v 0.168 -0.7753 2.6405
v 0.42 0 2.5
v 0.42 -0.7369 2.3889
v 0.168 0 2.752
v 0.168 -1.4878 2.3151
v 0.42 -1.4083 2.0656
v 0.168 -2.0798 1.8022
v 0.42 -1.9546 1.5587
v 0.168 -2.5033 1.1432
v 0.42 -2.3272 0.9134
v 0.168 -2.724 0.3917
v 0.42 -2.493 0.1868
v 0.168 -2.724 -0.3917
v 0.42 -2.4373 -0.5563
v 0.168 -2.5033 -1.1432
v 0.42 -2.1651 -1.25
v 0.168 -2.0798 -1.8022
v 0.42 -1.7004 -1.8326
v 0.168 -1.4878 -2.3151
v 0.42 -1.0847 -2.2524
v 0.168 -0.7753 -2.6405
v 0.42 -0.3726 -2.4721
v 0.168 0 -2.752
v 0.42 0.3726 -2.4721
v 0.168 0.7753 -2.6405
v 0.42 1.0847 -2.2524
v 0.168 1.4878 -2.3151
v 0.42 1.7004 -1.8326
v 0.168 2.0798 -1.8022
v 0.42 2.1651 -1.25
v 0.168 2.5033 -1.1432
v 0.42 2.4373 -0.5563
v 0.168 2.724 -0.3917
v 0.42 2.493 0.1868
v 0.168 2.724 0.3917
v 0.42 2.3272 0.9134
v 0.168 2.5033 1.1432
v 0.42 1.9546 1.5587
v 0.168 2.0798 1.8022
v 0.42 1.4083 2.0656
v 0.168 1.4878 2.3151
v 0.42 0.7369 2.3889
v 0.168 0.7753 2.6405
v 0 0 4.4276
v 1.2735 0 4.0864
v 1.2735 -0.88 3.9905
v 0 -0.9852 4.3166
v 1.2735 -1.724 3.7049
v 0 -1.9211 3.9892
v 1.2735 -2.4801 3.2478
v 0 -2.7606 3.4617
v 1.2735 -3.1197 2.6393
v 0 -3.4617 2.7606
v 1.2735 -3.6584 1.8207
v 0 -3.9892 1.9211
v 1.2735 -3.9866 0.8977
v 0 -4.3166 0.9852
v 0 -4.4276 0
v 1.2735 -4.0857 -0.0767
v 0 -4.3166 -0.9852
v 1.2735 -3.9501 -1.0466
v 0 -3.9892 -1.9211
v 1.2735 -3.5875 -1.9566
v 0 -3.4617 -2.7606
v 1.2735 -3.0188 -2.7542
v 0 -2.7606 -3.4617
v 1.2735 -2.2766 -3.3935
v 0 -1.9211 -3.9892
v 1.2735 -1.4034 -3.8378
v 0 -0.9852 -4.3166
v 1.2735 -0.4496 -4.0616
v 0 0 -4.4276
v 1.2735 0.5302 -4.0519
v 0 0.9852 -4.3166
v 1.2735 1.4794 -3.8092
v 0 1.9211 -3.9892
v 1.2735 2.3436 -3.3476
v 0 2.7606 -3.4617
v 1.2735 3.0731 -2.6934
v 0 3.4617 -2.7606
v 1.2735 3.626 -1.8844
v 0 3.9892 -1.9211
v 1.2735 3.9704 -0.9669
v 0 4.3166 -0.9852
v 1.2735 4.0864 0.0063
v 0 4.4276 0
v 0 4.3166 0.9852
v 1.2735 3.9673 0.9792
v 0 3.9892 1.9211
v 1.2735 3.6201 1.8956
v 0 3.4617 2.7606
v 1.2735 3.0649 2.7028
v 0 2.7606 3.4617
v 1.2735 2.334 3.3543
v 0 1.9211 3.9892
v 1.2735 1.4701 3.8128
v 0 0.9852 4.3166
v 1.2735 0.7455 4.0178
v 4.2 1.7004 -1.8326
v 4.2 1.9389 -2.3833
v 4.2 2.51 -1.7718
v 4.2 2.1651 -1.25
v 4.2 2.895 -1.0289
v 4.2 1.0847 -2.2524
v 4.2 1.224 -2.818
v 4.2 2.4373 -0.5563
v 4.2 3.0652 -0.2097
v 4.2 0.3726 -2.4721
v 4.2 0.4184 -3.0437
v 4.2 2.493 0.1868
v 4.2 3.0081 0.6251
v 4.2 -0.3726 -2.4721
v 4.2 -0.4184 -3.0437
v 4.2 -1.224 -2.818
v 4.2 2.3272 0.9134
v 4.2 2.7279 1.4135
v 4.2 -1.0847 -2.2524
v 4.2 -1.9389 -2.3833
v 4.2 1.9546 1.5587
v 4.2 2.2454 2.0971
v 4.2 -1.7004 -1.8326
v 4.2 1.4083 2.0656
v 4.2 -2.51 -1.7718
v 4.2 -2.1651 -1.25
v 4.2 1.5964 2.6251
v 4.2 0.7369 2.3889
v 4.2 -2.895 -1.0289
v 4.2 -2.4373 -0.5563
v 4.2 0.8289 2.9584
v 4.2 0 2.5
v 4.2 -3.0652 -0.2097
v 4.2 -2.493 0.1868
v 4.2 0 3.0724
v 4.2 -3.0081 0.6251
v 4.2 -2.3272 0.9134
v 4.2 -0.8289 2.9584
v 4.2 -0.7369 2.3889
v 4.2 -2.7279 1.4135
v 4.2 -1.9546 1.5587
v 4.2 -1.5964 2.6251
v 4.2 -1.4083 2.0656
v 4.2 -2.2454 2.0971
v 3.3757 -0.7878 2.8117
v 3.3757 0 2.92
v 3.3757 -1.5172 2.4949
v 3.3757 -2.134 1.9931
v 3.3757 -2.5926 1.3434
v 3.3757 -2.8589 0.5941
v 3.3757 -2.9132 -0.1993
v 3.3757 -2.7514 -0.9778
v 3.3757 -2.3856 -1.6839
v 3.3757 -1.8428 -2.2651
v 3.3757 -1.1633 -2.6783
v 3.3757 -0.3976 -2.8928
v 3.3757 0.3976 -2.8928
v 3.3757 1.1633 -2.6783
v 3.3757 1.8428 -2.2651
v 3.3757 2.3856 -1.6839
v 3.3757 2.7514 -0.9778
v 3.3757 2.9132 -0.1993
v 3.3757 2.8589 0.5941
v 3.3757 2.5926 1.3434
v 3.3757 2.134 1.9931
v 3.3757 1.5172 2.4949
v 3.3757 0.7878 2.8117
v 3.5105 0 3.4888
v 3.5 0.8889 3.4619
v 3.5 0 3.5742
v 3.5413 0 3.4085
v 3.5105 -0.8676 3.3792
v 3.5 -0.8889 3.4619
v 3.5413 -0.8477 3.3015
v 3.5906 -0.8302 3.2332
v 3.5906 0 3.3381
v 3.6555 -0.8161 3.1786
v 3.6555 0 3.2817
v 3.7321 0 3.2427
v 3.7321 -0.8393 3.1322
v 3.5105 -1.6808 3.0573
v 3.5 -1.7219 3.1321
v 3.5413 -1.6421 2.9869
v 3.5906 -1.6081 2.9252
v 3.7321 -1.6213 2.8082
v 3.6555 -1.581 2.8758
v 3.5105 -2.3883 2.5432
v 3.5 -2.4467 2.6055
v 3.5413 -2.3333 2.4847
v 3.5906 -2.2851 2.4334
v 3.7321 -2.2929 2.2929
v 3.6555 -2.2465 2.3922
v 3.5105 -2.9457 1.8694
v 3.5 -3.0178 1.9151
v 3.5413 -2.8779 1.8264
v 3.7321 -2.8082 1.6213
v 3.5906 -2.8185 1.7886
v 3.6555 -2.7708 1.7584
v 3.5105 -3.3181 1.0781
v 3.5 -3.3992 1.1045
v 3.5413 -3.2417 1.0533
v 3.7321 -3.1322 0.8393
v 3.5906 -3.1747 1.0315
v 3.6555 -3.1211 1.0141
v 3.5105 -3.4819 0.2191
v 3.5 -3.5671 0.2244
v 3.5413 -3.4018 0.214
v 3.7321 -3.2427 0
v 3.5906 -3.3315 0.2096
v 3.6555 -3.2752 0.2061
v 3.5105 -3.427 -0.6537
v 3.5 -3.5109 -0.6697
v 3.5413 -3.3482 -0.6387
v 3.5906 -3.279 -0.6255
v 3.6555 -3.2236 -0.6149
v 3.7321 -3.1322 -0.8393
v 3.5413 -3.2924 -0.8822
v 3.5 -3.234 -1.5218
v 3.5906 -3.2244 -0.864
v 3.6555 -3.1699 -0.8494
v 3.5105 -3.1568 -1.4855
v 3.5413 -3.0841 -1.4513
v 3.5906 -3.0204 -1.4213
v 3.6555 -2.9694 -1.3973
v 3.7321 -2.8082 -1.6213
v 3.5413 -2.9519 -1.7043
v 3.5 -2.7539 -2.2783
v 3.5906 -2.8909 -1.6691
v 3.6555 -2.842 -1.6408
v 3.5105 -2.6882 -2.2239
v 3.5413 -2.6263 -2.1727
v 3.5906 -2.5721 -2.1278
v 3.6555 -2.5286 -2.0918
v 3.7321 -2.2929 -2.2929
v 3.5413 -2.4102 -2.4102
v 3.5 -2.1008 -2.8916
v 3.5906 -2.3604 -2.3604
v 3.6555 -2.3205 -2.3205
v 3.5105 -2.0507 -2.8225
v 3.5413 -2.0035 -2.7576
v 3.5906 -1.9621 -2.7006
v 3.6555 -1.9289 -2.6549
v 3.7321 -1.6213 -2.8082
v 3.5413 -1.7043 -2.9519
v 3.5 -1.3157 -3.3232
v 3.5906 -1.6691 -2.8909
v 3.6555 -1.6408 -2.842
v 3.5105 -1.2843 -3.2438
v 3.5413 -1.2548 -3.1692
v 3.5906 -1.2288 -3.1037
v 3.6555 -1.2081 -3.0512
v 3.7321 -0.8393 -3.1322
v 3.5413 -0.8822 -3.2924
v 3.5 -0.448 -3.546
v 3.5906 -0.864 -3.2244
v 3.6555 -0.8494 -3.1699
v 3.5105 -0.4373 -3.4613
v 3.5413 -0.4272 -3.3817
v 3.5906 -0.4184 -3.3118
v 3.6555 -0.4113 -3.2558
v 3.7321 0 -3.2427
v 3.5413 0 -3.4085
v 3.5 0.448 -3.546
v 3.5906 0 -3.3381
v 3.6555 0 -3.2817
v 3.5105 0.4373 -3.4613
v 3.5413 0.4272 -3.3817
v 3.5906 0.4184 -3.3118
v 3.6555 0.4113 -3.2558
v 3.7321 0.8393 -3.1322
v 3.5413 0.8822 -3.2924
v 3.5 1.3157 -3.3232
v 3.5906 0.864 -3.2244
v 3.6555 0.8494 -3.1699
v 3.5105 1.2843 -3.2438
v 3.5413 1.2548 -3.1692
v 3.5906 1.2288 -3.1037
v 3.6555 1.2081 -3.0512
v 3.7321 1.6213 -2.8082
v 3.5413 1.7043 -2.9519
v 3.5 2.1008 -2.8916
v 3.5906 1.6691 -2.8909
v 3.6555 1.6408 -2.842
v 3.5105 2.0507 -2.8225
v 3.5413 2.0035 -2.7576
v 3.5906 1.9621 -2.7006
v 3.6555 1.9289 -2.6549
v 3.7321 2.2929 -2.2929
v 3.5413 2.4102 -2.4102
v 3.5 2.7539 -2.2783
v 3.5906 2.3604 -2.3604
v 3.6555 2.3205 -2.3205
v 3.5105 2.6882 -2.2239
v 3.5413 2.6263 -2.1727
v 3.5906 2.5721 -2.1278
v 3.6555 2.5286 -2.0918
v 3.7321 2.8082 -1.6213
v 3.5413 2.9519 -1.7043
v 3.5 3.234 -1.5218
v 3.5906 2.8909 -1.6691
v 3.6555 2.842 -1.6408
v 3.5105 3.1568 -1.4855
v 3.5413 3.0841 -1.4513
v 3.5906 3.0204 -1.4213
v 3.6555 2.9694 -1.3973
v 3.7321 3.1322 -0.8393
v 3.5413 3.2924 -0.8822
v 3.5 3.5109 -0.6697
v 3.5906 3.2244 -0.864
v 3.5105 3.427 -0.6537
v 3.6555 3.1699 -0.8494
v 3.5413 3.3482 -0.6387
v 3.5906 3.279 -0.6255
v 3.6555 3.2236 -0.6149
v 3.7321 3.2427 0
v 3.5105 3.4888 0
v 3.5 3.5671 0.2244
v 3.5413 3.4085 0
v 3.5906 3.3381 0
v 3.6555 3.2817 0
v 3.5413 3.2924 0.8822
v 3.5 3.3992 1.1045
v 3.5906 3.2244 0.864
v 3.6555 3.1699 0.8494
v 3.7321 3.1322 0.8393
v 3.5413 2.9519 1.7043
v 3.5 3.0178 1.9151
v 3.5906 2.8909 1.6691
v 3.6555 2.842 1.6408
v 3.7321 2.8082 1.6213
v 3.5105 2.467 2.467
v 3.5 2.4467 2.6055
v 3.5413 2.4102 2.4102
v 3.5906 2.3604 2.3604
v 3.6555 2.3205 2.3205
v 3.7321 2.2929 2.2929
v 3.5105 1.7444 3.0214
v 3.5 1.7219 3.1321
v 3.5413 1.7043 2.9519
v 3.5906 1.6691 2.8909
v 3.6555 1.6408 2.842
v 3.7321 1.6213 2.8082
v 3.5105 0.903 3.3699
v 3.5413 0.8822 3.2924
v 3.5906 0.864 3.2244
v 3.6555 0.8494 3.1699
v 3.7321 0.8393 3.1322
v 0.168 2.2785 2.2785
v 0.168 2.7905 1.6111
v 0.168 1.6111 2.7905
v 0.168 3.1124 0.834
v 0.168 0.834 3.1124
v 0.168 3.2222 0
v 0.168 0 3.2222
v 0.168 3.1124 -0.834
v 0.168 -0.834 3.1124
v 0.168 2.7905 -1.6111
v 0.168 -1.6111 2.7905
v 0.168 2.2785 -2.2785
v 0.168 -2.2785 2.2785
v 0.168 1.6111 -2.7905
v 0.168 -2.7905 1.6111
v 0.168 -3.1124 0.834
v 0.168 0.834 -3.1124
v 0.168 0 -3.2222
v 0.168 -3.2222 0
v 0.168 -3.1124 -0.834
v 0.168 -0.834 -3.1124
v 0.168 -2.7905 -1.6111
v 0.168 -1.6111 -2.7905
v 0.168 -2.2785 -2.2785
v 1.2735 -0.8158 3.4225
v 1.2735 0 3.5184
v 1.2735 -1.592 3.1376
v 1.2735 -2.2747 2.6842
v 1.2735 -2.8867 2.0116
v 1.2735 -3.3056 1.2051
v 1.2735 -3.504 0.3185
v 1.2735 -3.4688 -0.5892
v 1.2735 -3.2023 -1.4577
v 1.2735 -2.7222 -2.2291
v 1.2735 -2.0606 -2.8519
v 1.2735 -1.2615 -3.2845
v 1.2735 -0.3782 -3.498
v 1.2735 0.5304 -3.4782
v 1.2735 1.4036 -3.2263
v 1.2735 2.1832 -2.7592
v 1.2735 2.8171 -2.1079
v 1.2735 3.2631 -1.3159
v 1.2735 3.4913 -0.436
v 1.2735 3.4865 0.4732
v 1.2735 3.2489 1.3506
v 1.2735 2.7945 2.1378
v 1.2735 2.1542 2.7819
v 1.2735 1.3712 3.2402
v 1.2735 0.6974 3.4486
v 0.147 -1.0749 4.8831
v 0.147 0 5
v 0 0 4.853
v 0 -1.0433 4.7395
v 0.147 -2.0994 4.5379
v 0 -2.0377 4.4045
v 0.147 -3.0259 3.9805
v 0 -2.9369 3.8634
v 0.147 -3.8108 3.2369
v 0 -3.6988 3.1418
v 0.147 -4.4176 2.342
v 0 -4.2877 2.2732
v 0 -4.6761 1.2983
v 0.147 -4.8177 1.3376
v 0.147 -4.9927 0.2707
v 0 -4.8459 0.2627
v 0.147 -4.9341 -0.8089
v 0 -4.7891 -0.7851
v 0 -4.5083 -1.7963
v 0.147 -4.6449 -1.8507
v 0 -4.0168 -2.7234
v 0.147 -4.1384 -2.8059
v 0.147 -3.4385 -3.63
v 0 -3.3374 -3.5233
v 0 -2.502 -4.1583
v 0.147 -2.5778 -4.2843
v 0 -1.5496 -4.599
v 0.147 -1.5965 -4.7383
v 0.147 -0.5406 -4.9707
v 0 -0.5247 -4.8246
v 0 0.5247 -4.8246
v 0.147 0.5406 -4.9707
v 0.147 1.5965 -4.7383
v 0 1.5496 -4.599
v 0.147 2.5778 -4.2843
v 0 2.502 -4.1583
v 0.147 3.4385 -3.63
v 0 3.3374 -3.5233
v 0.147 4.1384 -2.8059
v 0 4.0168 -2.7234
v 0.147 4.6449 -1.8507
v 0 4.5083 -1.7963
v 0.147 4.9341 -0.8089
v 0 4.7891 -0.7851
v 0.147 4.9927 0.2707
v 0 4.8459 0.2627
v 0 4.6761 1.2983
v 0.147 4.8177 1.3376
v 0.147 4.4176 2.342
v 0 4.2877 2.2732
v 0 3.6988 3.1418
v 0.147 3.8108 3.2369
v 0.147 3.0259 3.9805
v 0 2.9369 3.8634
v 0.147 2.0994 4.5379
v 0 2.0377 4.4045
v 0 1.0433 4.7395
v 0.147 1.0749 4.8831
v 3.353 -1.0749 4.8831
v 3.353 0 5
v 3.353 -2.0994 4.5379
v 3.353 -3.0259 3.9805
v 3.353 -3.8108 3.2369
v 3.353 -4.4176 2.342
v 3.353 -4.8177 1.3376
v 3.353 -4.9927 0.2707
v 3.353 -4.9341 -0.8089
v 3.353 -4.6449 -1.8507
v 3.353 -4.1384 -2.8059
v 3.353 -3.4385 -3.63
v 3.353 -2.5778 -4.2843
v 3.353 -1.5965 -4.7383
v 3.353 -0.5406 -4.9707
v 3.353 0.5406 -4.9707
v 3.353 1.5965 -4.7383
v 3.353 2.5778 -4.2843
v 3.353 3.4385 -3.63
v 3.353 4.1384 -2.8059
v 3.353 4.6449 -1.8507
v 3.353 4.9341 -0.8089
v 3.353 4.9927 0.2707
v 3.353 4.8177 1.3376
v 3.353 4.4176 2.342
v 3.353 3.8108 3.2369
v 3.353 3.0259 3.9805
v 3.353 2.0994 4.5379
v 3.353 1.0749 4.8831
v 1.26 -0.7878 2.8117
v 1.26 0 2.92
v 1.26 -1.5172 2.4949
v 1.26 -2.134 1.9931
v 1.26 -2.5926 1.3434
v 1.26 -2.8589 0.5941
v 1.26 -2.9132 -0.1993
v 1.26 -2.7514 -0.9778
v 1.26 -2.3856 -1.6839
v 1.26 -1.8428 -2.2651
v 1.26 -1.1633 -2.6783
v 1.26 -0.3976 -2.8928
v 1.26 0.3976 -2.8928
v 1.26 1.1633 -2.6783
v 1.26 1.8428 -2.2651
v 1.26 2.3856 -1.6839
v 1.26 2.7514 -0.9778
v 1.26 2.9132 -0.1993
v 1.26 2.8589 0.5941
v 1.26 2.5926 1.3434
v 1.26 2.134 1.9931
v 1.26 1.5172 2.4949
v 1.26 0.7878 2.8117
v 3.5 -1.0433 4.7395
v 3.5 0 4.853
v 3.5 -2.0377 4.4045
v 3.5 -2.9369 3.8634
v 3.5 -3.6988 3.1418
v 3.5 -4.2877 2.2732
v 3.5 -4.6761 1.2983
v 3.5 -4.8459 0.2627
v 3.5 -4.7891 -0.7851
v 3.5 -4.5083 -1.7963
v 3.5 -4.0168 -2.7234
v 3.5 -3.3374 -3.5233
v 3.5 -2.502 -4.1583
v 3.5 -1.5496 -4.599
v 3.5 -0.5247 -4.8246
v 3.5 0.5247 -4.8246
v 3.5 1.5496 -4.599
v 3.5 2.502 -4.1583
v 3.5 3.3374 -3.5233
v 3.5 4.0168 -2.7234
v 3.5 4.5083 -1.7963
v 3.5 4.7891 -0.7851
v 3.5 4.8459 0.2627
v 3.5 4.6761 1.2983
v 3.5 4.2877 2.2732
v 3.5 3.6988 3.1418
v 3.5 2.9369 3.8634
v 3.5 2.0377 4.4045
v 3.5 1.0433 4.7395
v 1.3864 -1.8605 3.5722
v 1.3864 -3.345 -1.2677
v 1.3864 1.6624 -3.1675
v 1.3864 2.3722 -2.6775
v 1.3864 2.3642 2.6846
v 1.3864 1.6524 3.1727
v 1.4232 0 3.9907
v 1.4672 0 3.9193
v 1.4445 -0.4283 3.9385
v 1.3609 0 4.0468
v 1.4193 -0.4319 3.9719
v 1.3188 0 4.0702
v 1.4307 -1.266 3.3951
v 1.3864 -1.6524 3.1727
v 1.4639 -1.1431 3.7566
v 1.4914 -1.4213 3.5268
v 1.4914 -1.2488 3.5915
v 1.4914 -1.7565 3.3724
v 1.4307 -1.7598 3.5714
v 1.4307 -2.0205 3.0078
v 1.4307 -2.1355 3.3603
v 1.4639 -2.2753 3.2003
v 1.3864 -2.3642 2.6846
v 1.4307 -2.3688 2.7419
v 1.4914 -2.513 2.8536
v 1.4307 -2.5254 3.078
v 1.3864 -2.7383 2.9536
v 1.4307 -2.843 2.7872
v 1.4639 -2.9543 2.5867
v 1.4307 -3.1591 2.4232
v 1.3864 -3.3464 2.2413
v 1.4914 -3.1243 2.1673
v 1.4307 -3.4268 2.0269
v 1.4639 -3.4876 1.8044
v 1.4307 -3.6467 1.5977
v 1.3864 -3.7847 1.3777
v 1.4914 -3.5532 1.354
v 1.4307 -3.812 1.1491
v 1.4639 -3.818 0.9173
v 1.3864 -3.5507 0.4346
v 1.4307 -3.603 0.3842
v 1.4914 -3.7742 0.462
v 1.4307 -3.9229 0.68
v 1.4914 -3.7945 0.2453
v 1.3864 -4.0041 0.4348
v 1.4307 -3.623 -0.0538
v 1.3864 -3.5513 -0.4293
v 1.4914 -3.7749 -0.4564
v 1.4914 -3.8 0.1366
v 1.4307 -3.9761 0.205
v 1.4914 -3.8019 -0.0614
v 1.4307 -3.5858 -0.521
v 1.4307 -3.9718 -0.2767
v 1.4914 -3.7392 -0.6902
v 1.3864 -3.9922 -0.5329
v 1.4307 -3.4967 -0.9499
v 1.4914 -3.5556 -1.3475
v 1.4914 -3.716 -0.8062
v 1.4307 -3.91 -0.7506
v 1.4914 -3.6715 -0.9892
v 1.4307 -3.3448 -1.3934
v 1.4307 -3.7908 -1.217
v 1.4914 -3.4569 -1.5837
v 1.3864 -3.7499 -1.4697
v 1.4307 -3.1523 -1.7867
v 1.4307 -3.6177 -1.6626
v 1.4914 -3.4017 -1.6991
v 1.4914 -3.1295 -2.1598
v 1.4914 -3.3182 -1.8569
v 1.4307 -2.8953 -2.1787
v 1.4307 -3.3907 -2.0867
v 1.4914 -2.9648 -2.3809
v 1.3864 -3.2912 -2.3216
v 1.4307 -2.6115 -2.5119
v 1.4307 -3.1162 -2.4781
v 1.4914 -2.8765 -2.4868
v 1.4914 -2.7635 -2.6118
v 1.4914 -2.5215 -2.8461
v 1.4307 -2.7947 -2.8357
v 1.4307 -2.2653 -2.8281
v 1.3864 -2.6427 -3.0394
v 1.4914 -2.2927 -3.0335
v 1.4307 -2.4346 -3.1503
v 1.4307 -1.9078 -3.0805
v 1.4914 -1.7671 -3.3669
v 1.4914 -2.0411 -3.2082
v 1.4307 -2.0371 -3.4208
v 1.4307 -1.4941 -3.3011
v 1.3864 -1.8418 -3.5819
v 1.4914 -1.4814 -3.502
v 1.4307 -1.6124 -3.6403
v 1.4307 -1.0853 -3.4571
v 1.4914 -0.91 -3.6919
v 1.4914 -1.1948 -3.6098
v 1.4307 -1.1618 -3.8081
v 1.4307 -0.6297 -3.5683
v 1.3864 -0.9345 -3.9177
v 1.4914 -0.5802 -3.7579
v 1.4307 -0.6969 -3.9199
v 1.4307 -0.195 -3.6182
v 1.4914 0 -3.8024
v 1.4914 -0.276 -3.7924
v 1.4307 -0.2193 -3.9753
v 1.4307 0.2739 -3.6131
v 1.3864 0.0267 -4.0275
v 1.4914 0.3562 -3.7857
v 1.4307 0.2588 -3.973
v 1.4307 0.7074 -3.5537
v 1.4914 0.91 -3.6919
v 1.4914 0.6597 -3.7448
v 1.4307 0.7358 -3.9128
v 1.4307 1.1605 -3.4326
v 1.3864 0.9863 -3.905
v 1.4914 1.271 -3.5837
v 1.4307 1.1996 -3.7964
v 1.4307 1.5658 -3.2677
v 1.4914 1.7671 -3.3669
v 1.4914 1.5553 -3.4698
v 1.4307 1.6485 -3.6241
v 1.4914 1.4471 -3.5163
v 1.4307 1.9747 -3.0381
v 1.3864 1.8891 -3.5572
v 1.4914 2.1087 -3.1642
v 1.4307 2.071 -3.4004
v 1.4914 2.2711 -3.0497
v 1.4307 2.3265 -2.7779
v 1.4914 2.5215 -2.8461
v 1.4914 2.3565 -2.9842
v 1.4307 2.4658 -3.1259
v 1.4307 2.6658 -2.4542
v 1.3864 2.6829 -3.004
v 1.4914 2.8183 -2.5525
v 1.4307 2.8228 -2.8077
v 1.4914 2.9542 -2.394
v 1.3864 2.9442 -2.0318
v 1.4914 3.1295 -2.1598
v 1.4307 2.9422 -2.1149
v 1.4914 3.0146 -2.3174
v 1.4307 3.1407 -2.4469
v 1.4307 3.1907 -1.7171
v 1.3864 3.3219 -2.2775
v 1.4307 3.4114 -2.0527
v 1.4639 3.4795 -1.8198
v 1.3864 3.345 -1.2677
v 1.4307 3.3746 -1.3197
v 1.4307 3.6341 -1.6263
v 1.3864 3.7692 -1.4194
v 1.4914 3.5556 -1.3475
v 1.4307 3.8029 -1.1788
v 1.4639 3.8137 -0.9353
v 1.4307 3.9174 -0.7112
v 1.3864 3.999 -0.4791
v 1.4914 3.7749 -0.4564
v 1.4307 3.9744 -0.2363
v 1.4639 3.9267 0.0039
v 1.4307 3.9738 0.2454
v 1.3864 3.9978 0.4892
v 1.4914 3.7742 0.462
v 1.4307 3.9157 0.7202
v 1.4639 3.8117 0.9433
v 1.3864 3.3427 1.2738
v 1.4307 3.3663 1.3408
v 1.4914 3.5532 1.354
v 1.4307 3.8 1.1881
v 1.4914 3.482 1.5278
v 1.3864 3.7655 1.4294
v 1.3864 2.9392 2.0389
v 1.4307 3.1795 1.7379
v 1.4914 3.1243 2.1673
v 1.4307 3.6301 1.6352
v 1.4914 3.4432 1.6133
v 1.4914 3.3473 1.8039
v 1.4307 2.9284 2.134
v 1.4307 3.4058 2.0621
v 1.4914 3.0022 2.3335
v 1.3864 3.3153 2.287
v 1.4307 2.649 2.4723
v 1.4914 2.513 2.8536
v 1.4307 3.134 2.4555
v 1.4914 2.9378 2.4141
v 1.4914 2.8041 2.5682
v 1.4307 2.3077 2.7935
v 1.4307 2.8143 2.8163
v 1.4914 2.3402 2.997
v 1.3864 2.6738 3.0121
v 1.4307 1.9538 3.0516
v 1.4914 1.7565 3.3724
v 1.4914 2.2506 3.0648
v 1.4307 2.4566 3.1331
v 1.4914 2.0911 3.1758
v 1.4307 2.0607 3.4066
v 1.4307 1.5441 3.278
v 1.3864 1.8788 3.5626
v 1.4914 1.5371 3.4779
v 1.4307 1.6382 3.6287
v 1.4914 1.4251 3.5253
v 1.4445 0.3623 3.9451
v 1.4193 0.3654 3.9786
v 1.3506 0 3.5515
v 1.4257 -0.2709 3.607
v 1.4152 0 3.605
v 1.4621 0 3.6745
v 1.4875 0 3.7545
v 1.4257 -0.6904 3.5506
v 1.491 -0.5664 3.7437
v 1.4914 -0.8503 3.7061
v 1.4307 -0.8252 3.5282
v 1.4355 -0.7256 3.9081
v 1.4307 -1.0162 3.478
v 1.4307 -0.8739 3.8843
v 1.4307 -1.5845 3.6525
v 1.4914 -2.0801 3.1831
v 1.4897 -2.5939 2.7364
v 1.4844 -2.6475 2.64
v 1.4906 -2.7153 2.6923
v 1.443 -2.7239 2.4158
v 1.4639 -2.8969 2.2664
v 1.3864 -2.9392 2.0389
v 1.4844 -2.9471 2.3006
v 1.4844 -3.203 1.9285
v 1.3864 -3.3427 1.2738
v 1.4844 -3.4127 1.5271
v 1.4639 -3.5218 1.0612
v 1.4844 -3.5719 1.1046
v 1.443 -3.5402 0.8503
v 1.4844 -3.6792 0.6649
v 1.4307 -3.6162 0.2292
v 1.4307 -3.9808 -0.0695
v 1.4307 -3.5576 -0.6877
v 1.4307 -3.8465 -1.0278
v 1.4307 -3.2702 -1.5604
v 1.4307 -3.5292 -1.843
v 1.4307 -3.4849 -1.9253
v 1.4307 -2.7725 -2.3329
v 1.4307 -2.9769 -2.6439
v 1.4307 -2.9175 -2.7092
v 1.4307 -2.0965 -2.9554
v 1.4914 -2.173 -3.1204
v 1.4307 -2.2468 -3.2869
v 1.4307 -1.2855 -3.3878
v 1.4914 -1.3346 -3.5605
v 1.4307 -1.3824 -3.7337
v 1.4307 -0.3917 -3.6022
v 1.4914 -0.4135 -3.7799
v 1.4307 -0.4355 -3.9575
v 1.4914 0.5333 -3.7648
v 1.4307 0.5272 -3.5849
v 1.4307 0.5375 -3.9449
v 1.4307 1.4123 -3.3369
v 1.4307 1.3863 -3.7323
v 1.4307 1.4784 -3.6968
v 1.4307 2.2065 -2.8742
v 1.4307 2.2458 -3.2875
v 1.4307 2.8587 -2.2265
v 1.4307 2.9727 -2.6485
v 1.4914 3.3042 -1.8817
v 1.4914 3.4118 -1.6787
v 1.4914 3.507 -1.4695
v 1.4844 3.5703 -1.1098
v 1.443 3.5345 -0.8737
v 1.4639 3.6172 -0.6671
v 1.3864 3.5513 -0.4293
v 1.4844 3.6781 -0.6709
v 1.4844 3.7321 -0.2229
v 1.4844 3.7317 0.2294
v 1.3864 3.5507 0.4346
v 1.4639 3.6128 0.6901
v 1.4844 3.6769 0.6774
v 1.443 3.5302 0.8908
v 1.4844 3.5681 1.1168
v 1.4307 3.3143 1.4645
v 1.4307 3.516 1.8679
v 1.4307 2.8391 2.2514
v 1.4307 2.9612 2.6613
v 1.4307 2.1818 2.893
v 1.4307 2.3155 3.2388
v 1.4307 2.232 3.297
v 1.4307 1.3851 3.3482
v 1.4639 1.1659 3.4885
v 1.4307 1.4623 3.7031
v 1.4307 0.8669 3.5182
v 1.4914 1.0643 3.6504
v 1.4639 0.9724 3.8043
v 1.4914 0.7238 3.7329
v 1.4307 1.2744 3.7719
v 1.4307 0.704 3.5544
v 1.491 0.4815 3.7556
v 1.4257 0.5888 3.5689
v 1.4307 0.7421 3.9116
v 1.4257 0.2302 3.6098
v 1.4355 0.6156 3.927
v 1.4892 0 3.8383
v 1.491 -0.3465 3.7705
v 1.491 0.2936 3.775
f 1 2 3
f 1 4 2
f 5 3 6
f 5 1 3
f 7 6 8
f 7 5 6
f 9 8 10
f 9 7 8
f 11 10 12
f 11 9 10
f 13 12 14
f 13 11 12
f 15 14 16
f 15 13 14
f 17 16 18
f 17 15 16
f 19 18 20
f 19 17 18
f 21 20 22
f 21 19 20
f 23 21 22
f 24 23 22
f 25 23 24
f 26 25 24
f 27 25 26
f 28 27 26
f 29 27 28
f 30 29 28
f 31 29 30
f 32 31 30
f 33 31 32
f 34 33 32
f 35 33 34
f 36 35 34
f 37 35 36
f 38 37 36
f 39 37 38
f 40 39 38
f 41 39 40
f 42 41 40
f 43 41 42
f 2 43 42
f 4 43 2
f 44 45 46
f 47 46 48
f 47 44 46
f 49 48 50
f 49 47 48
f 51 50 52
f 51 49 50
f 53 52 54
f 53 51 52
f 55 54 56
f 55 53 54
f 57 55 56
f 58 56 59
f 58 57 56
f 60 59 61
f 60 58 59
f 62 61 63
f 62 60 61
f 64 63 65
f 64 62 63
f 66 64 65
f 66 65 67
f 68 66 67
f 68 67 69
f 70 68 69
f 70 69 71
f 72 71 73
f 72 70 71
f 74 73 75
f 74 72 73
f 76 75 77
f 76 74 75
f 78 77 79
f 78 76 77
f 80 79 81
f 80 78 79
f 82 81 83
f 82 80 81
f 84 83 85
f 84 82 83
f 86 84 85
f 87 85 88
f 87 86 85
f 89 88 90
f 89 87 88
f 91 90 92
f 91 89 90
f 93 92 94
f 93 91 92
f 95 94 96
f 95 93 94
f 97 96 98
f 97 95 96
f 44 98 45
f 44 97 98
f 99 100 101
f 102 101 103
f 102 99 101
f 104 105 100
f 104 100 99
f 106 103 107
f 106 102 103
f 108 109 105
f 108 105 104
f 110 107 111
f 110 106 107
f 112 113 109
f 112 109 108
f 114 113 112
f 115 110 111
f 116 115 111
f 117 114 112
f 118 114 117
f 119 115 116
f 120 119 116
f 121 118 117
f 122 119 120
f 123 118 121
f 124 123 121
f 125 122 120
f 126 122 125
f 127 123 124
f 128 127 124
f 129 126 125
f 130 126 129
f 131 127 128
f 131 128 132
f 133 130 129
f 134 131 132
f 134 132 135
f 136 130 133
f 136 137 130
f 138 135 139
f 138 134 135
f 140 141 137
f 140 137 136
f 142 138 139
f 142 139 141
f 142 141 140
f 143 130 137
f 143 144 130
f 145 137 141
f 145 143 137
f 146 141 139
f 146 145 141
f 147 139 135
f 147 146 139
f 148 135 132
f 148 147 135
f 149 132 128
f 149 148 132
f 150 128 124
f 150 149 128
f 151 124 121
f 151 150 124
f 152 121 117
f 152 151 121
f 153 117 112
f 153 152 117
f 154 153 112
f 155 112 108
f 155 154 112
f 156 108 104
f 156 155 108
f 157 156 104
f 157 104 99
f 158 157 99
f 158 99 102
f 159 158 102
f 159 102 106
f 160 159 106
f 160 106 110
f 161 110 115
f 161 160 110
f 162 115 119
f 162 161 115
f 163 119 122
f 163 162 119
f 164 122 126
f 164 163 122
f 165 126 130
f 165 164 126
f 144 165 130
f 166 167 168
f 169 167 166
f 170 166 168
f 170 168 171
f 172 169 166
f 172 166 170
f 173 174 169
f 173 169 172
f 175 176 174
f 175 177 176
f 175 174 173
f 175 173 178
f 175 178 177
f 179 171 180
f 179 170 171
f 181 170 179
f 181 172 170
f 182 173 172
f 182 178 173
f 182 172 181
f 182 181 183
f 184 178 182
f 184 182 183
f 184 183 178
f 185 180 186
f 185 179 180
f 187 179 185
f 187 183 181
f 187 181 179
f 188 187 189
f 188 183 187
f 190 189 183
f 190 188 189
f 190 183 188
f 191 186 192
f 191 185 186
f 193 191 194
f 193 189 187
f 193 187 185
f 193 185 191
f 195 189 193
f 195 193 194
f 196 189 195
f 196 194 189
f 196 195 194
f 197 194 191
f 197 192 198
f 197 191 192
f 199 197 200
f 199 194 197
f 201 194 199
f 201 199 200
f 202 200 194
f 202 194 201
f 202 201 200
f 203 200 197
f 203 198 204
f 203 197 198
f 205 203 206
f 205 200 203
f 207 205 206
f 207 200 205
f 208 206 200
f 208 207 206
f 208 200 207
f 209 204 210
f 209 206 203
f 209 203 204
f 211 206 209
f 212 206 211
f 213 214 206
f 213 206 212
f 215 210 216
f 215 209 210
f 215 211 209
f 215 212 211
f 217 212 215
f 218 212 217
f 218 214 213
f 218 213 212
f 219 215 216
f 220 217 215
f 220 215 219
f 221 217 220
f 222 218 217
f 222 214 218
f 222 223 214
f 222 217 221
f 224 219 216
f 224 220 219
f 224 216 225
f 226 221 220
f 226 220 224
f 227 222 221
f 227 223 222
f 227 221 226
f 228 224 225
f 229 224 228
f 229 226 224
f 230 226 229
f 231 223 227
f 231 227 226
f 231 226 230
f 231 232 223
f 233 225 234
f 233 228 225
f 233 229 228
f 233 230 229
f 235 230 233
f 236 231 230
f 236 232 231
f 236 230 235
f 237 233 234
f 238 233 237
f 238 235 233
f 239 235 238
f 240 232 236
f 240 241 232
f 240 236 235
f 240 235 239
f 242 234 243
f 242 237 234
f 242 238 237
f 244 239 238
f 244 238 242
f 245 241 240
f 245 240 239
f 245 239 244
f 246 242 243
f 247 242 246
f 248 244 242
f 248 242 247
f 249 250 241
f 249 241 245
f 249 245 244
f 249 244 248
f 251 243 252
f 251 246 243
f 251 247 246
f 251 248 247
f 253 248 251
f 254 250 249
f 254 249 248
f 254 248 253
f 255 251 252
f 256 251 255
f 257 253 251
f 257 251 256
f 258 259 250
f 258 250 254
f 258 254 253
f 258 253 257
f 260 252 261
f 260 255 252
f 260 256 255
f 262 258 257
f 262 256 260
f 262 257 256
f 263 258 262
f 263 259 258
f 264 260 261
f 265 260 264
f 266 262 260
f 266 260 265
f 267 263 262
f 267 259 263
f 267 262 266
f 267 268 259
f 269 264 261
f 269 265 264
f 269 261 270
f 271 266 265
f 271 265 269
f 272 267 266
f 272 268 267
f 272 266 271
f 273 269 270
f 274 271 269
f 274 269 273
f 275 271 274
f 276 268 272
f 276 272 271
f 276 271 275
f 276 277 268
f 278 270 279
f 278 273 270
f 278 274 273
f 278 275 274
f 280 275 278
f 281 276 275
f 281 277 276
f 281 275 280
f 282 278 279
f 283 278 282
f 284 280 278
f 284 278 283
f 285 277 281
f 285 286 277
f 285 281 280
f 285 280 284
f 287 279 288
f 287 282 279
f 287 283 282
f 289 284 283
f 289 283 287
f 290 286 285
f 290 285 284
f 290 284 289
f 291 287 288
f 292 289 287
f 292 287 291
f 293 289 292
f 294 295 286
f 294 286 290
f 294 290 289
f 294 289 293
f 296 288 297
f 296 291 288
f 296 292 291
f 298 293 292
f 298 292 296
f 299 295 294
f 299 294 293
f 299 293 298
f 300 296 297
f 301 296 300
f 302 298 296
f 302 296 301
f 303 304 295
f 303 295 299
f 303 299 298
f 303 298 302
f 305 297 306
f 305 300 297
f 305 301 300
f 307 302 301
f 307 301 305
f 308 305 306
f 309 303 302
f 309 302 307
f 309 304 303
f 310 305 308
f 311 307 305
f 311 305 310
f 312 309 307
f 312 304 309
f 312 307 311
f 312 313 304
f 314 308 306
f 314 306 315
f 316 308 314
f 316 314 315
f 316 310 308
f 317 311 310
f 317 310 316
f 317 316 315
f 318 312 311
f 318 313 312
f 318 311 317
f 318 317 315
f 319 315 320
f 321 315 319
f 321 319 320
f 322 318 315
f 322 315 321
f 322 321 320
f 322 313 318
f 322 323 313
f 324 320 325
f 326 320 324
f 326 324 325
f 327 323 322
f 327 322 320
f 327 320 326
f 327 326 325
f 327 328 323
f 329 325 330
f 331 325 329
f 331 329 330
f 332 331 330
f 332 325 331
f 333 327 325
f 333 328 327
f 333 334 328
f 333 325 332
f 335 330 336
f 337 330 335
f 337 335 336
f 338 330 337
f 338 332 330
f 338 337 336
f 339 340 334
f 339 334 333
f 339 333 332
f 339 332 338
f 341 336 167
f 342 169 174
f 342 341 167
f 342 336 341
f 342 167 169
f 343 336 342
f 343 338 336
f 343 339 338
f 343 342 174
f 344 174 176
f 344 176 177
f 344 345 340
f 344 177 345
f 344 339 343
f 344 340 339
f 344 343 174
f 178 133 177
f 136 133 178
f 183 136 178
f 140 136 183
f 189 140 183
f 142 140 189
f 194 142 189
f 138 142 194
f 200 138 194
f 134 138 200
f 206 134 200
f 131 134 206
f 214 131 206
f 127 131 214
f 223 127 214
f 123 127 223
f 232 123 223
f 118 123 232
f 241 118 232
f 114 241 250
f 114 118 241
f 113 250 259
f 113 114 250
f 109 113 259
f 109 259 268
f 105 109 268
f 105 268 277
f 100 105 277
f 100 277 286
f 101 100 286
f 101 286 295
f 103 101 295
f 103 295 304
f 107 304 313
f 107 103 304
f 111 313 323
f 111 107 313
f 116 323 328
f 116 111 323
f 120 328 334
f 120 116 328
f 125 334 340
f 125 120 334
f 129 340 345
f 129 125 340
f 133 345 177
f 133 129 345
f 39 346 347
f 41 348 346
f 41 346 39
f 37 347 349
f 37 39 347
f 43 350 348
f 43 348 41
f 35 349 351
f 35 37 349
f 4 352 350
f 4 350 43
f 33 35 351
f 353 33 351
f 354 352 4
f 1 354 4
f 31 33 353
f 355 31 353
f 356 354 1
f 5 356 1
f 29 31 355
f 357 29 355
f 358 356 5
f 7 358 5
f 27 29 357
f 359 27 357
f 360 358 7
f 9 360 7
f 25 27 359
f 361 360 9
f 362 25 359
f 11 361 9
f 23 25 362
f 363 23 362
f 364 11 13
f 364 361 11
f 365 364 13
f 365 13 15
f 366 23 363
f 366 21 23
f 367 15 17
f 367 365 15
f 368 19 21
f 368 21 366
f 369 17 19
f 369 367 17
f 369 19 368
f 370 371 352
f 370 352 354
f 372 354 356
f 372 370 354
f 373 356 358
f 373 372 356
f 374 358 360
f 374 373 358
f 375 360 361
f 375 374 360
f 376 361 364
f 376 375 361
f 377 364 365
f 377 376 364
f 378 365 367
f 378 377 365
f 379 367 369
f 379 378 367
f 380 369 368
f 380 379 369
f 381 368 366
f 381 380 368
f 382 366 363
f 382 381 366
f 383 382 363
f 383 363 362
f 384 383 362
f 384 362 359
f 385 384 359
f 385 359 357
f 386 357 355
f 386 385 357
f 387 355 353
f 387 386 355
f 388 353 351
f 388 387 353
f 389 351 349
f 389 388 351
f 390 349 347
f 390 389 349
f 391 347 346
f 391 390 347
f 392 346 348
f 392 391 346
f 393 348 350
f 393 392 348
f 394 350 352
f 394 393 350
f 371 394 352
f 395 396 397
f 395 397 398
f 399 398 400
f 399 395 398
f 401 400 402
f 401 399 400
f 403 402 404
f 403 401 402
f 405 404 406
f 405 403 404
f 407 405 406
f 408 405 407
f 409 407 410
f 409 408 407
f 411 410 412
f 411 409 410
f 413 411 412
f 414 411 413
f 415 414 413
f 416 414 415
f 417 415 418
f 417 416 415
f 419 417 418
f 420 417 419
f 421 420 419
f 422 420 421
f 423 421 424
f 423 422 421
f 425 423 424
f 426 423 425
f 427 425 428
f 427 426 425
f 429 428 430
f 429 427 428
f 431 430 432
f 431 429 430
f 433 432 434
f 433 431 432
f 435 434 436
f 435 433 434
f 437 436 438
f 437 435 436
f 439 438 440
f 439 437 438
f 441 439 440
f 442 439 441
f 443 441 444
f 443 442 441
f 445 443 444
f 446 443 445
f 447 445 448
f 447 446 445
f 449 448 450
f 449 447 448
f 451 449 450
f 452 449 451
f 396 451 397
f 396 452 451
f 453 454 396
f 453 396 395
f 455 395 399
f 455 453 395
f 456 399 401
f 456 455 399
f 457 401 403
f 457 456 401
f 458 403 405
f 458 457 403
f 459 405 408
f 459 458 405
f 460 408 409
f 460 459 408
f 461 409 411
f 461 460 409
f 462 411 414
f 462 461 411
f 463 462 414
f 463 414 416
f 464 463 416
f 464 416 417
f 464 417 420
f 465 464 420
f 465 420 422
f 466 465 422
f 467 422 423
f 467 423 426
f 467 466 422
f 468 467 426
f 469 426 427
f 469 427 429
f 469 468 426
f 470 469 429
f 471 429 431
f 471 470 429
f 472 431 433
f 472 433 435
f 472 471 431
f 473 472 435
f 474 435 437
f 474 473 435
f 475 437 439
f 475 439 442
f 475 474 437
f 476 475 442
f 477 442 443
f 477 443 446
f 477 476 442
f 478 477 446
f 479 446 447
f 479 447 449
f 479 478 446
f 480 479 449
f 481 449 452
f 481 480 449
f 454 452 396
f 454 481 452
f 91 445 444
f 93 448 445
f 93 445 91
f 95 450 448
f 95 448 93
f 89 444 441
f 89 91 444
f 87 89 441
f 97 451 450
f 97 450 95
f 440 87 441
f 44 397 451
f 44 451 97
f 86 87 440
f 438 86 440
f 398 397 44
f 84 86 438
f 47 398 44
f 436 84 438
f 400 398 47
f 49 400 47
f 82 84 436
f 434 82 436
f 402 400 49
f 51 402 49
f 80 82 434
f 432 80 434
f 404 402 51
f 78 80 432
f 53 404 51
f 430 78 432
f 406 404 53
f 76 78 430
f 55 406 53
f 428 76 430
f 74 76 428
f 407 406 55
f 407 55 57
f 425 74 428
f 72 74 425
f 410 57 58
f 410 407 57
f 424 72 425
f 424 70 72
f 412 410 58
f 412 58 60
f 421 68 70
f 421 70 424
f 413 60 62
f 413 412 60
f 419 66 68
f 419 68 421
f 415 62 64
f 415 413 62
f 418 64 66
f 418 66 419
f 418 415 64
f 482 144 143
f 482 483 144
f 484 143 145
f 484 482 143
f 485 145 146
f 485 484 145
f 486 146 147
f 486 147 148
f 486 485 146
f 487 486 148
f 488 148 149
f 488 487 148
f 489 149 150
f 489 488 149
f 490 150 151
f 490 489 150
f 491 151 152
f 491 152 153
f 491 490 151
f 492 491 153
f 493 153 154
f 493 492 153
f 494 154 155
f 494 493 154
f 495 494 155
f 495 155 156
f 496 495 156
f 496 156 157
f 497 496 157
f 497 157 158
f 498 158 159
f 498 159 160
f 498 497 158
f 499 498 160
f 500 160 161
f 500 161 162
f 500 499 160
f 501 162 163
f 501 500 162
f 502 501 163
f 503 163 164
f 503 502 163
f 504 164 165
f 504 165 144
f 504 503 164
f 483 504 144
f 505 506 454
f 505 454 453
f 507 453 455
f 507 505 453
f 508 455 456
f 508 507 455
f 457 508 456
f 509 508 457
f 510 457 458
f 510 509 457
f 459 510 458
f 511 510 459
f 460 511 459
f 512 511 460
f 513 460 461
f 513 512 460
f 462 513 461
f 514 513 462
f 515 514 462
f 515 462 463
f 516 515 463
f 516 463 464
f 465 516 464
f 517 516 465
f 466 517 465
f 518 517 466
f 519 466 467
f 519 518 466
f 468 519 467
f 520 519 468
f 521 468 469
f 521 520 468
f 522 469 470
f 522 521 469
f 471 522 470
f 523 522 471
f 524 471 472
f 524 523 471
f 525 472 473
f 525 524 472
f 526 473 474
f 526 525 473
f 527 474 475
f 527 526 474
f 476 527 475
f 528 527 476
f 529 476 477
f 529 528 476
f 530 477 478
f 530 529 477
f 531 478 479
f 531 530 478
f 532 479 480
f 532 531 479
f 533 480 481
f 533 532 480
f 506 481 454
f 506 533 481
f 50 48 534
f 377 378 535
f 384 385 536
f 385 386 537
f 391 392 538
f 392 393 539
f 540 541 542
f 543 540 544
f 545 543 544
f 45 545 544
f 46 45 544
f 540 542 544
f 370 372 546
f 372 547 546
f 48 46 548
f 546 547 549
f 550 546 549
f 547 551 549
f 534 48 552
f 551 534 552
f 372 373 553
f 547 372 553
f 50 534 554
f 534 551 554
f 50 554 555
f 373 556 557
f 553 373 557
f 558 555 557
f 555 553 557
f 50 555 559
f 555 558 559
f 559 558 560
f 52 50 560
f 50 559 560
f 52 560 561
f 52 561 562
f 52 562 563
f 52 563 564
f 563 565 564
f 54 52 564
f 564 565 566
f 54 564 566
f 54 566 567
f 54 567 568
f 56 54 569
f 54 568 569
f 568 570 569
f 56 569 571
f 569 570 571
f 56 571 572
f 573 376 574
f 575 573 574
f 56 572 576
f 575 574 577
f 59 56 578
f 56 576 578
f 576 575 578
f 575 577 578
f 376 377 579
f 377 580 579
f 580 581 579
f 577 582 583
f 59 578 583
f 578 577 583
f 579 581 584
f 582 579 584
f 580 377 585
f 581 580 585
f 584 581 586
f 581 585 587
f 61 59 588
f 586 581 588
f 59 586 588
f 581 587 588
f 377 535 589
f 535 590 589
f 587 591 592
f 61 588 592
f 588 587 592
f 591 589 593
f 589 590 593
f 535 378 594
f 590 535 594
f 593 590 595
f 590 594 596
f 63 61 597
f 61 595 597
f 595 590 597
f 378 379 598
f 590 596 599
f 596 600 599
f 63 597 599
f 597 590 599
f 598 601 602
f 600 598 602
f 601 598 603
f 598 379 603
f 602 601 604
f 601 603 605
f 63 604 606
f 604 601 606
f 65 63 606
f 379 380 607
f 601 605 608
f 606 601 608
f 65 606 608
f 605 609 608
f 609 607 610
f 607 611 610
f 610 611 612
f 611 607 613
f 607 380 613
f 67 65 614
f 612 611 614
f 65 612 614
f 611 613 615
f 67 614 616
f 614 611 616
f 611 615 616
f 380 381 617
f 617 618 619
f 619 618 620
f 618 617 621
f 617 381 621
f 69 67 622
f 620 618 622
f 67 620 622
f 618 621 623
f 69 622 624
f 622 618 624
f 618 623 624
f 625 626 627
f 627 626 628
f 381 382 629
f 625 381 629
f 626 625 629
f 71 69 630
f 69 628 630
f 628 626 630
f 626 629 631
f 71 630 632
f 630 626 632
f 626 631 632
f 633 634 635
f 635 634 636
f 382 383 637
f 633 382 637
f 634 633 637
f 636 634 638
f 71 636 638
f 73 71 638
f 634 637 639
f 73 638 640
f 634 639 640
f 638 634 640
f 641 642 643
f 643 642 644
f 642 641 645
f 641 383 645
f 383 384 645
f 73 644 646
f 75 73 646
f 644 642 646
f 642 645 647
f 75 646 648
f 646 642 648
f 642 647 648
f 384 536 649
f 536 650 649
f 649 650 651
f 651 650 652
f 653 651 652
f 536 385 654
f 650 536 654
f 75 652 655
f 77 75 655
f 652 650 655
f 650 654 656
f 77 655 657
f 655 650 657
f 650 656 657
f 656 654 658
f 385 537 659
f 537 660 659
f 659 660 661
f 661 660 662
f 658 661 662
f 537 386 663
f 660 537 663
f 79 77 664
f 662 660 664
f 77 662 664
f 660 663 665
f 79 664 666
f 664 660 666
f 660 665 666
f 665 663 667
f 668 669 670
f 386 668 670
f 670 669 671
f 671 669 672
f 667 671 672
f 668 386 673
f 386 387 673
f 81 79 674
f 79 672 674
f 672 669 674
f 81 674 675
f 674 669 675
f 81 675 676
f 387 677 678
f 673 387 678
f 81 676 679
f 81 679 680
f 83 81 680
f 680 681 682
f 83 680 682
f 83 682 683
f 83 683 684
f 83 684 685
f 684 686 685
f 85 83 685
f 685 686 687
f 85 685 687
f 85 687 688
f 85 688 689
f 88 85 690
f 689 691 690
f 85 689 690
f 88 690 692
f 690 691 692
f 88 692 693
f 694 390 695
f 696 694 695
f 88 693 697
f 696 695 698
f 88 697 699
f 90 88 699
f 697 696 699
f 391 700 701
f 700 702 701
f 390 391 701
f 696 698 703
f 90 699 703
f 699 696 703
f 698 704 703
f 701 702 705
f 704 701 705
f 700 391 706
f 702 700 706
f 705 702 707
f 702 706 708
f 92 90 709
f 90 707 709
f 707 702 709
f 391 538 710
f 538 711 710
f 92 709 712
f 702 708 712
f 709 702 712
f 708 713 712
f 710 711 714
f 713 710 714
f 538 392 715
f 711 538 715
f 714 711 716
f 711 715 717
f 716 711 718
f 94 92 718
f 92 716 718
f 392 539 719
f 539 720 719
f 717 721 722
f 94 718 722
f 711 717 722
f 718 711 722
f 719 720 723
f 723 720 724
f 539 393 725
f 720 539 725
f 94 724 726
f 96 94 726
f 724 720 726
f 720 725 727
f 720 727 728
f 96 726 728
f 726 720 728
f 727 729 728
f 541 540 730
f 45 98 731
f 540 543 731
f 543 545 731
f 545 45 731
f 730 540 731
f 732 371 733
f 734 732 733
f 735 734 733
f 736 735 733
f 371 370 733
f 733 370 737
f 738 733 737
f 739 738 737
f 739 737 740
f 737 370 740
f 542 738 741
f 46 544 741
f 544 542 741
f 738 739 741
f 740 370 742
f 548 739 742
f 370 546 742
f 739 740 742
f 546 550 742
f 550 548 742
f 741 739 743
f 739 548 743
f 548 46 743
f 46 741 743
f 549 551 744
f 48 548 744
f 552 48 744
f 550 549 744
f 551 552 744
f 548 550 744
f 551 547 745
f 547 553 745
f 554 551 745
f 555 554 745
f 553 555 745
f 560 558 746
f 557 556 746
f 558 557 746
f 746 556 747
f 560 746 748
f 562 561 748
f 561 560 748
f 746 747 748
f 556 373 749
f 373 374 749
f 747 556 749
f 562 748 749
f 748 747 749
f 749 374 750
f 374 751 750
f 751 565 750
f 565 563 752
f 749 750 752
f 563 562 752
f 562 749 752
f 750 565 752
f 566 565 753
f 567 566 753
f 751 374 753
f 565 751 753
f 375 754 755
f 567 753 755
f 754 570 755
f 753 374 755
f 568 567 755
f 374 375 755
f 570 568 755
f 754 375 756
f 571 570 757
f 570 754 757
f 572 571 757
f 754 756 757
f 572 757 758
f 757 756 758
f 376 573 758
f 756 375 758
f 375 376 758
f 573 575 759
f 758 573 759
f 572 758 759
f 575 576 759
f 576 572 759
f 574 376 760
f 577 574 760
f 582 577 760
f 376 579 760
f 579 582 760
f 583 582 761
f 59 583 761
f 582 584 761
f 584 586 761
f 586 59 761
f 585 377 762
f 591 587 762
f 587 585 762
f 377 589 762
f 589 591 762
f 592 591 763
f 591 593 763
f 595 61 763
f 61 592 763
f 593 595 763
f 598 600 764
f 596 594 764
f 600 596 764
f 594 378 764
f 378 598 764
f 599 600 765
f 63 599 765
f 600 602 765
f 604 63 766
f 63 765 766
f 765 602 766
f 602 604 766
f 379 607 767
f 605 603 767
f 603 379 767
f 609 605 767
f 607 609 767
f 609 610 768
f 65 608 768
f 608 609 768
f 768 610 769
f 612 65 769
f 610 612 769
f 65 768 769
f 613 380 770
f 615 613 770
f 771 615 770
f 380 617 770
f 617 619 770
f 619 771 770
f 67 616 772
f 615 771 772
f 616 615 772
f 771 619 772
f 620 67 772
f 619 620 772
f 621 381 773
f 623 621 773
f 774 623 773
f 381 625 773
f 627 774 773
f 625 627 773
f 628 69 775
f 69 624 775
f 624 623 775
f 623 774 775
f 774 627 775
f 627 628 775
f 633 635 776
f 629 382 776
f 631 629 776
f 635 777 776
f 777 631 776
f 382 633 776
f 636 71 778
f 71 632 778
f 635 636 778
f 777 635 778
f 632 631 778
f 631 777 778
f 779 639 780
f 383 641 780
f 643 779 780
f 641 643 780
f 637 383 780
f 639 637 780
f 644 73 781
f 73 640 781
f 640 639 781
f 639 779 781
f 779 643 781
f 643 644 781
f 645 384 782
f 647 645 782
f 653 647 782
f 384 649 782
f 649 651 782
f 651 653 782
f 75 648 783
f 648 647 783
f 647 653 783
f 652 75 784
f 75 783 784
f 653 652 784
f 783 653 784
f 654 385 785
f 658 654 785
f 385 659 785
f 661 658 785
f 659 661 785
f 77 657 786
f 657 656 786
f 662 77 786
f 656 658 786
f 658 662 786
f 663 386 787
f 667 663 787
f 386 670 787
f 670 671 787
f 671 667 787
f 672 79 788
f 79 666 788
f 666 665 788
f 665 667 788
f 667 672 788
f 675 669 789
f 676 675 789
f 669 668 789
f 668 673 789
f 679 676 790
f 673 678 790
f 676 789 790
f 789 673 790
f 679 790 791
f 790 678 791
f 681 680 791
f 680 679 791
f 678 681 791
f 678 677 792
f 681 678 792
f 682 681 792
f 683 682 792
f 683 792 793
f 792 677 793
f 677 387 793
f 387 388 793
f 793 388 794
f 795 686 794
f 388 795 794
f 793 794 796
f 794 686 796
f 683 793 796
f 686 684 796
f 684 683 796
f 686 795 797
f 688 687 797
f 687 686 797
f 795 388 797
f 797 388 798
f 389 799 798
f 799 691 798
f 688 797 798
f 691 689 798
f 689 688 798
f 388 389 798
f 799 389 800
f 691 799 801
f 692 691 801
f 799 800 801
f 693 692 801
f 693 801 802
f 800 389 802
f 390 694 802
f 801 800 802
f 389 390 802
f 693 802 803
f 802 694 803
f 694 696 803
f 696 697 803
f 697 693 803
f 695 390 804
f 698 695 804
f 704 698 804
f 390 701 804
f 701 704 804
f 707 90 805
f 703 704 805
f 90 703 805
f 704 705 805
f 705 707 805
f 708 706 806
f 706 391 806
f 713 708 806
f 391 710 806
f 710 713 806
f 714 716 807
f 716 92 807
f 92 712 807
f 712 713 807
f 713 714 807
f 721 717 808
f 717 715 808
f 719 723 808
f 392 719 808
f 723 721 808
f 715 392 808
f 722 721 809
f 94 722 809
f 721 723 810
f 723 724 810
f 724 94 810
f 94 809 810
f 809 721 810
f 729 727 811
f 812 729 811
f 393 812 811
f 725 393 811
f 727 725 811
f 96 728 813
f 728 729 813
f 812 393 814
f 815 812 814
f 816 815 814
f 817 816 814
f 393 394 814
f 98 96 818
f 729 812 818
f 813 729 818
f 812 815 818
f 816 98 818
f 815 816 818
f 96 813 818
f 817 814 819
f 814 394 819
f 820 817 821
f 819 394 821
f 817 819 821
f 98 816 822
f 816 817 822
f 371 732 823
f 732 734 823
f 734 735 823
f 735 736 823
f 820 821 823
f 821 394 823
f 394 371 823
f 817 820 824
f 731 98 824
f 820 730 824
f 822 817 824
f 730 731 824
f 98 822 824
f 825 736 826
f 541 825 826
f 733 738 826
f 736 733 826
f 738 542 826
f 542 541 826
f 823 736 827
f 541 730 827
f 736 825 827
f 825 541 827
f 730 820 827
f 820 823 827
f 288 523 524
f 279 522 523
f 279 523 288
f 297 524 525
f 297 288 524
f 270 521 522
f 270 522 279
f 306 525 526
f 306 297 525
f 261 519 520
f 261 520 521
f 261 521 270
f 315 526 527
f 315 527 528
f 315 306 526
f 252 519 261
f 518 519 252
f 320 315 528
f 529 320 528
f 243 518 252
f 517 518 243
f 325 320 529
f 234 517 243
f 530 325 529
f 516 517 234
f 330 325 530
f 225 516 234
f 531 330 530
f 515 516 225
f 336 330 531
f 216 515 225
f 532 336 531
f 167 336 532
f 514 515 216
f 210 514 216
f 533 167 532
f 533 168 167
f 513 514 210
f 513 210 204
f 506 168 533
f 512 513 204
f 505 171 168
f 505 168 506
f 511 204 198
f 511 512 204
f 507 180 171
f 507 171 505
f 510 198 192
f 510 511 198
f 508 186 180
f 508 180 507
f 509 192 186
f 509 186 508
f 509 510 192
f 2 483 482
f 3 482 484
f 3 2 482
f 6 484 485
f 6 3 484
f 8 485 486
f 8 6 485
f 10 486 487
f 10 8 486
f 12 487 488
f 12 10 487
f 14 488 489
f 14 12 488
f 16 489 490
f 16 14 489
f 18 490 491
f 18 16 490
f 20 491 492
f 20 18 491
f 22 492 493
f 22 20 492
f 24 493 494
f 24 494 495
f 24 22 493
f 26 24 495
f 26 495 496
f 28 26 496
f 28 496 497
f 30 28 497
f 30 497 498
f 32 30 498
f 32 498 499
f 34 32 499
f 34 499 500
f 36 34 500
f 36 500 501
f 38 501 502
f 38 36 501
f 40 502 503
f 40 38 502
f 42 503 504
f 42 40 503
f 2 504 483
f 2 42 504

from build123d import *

# Parameters (mm, degrees)
ZAOBLIT1_R   = 0.294
ZKOSIT1_SIZE = 0.147
ZAOBLIT2_R   = 0.3528


with BuildPart() as part:
    # Skica1 → Otočit kolem osy1 (revolve)
    with BuildSketch(Plane.XY, mode=Mode.PRIVATE) as oto_it_kolem_osy1_sk:
        Polygon((0, 5), (3.5, 5), (3.5, 3.327141994), (4.2, 3.07236283), (4.2, 2.5), (3.375703588, 2.92), (1.26, 2.92), (0.42, 2.5), (0.168, 2.752), (0.168, 3.222223069), (2.333333333, 3.802422387), (0, 4.42763717), align=None)
    revolve(oto_it_kolem_osy1_sk.sketch.rotate(Axis((0, 0, 0), (1, 0, 0)), 90), axis=Axis((0, 0, 0), (1, 0, 0)))

    # Zaoblit1
    zaoblit1_edges = [part.edges().sort_by_distance(p)[0] for p in [
        (2.333333333, 0, -3.802422387),
    ]]
    fillet(zaoblit1_edges, radius=ZAOBLIT1_R)

    # Zkosit1
    zkosit1_edges = [part.edges().sort_by_distance(p)[0] for p in [
        (3.5, 0, -5),
        (0, 0, -5),
    ]]
    chamfer(zkosit1_edges, length=ZKOSIT1_SIZE)

    # Zaoblit2
    zaoblit2_edges = [part.edges().sort_by_distance(p)[0] for p in [
        (3.5, 0, -3.327141994),
    ]]
    fillet(zaoblit2_edges, radius=ZAOBLIT2_R)


solid = part.part
